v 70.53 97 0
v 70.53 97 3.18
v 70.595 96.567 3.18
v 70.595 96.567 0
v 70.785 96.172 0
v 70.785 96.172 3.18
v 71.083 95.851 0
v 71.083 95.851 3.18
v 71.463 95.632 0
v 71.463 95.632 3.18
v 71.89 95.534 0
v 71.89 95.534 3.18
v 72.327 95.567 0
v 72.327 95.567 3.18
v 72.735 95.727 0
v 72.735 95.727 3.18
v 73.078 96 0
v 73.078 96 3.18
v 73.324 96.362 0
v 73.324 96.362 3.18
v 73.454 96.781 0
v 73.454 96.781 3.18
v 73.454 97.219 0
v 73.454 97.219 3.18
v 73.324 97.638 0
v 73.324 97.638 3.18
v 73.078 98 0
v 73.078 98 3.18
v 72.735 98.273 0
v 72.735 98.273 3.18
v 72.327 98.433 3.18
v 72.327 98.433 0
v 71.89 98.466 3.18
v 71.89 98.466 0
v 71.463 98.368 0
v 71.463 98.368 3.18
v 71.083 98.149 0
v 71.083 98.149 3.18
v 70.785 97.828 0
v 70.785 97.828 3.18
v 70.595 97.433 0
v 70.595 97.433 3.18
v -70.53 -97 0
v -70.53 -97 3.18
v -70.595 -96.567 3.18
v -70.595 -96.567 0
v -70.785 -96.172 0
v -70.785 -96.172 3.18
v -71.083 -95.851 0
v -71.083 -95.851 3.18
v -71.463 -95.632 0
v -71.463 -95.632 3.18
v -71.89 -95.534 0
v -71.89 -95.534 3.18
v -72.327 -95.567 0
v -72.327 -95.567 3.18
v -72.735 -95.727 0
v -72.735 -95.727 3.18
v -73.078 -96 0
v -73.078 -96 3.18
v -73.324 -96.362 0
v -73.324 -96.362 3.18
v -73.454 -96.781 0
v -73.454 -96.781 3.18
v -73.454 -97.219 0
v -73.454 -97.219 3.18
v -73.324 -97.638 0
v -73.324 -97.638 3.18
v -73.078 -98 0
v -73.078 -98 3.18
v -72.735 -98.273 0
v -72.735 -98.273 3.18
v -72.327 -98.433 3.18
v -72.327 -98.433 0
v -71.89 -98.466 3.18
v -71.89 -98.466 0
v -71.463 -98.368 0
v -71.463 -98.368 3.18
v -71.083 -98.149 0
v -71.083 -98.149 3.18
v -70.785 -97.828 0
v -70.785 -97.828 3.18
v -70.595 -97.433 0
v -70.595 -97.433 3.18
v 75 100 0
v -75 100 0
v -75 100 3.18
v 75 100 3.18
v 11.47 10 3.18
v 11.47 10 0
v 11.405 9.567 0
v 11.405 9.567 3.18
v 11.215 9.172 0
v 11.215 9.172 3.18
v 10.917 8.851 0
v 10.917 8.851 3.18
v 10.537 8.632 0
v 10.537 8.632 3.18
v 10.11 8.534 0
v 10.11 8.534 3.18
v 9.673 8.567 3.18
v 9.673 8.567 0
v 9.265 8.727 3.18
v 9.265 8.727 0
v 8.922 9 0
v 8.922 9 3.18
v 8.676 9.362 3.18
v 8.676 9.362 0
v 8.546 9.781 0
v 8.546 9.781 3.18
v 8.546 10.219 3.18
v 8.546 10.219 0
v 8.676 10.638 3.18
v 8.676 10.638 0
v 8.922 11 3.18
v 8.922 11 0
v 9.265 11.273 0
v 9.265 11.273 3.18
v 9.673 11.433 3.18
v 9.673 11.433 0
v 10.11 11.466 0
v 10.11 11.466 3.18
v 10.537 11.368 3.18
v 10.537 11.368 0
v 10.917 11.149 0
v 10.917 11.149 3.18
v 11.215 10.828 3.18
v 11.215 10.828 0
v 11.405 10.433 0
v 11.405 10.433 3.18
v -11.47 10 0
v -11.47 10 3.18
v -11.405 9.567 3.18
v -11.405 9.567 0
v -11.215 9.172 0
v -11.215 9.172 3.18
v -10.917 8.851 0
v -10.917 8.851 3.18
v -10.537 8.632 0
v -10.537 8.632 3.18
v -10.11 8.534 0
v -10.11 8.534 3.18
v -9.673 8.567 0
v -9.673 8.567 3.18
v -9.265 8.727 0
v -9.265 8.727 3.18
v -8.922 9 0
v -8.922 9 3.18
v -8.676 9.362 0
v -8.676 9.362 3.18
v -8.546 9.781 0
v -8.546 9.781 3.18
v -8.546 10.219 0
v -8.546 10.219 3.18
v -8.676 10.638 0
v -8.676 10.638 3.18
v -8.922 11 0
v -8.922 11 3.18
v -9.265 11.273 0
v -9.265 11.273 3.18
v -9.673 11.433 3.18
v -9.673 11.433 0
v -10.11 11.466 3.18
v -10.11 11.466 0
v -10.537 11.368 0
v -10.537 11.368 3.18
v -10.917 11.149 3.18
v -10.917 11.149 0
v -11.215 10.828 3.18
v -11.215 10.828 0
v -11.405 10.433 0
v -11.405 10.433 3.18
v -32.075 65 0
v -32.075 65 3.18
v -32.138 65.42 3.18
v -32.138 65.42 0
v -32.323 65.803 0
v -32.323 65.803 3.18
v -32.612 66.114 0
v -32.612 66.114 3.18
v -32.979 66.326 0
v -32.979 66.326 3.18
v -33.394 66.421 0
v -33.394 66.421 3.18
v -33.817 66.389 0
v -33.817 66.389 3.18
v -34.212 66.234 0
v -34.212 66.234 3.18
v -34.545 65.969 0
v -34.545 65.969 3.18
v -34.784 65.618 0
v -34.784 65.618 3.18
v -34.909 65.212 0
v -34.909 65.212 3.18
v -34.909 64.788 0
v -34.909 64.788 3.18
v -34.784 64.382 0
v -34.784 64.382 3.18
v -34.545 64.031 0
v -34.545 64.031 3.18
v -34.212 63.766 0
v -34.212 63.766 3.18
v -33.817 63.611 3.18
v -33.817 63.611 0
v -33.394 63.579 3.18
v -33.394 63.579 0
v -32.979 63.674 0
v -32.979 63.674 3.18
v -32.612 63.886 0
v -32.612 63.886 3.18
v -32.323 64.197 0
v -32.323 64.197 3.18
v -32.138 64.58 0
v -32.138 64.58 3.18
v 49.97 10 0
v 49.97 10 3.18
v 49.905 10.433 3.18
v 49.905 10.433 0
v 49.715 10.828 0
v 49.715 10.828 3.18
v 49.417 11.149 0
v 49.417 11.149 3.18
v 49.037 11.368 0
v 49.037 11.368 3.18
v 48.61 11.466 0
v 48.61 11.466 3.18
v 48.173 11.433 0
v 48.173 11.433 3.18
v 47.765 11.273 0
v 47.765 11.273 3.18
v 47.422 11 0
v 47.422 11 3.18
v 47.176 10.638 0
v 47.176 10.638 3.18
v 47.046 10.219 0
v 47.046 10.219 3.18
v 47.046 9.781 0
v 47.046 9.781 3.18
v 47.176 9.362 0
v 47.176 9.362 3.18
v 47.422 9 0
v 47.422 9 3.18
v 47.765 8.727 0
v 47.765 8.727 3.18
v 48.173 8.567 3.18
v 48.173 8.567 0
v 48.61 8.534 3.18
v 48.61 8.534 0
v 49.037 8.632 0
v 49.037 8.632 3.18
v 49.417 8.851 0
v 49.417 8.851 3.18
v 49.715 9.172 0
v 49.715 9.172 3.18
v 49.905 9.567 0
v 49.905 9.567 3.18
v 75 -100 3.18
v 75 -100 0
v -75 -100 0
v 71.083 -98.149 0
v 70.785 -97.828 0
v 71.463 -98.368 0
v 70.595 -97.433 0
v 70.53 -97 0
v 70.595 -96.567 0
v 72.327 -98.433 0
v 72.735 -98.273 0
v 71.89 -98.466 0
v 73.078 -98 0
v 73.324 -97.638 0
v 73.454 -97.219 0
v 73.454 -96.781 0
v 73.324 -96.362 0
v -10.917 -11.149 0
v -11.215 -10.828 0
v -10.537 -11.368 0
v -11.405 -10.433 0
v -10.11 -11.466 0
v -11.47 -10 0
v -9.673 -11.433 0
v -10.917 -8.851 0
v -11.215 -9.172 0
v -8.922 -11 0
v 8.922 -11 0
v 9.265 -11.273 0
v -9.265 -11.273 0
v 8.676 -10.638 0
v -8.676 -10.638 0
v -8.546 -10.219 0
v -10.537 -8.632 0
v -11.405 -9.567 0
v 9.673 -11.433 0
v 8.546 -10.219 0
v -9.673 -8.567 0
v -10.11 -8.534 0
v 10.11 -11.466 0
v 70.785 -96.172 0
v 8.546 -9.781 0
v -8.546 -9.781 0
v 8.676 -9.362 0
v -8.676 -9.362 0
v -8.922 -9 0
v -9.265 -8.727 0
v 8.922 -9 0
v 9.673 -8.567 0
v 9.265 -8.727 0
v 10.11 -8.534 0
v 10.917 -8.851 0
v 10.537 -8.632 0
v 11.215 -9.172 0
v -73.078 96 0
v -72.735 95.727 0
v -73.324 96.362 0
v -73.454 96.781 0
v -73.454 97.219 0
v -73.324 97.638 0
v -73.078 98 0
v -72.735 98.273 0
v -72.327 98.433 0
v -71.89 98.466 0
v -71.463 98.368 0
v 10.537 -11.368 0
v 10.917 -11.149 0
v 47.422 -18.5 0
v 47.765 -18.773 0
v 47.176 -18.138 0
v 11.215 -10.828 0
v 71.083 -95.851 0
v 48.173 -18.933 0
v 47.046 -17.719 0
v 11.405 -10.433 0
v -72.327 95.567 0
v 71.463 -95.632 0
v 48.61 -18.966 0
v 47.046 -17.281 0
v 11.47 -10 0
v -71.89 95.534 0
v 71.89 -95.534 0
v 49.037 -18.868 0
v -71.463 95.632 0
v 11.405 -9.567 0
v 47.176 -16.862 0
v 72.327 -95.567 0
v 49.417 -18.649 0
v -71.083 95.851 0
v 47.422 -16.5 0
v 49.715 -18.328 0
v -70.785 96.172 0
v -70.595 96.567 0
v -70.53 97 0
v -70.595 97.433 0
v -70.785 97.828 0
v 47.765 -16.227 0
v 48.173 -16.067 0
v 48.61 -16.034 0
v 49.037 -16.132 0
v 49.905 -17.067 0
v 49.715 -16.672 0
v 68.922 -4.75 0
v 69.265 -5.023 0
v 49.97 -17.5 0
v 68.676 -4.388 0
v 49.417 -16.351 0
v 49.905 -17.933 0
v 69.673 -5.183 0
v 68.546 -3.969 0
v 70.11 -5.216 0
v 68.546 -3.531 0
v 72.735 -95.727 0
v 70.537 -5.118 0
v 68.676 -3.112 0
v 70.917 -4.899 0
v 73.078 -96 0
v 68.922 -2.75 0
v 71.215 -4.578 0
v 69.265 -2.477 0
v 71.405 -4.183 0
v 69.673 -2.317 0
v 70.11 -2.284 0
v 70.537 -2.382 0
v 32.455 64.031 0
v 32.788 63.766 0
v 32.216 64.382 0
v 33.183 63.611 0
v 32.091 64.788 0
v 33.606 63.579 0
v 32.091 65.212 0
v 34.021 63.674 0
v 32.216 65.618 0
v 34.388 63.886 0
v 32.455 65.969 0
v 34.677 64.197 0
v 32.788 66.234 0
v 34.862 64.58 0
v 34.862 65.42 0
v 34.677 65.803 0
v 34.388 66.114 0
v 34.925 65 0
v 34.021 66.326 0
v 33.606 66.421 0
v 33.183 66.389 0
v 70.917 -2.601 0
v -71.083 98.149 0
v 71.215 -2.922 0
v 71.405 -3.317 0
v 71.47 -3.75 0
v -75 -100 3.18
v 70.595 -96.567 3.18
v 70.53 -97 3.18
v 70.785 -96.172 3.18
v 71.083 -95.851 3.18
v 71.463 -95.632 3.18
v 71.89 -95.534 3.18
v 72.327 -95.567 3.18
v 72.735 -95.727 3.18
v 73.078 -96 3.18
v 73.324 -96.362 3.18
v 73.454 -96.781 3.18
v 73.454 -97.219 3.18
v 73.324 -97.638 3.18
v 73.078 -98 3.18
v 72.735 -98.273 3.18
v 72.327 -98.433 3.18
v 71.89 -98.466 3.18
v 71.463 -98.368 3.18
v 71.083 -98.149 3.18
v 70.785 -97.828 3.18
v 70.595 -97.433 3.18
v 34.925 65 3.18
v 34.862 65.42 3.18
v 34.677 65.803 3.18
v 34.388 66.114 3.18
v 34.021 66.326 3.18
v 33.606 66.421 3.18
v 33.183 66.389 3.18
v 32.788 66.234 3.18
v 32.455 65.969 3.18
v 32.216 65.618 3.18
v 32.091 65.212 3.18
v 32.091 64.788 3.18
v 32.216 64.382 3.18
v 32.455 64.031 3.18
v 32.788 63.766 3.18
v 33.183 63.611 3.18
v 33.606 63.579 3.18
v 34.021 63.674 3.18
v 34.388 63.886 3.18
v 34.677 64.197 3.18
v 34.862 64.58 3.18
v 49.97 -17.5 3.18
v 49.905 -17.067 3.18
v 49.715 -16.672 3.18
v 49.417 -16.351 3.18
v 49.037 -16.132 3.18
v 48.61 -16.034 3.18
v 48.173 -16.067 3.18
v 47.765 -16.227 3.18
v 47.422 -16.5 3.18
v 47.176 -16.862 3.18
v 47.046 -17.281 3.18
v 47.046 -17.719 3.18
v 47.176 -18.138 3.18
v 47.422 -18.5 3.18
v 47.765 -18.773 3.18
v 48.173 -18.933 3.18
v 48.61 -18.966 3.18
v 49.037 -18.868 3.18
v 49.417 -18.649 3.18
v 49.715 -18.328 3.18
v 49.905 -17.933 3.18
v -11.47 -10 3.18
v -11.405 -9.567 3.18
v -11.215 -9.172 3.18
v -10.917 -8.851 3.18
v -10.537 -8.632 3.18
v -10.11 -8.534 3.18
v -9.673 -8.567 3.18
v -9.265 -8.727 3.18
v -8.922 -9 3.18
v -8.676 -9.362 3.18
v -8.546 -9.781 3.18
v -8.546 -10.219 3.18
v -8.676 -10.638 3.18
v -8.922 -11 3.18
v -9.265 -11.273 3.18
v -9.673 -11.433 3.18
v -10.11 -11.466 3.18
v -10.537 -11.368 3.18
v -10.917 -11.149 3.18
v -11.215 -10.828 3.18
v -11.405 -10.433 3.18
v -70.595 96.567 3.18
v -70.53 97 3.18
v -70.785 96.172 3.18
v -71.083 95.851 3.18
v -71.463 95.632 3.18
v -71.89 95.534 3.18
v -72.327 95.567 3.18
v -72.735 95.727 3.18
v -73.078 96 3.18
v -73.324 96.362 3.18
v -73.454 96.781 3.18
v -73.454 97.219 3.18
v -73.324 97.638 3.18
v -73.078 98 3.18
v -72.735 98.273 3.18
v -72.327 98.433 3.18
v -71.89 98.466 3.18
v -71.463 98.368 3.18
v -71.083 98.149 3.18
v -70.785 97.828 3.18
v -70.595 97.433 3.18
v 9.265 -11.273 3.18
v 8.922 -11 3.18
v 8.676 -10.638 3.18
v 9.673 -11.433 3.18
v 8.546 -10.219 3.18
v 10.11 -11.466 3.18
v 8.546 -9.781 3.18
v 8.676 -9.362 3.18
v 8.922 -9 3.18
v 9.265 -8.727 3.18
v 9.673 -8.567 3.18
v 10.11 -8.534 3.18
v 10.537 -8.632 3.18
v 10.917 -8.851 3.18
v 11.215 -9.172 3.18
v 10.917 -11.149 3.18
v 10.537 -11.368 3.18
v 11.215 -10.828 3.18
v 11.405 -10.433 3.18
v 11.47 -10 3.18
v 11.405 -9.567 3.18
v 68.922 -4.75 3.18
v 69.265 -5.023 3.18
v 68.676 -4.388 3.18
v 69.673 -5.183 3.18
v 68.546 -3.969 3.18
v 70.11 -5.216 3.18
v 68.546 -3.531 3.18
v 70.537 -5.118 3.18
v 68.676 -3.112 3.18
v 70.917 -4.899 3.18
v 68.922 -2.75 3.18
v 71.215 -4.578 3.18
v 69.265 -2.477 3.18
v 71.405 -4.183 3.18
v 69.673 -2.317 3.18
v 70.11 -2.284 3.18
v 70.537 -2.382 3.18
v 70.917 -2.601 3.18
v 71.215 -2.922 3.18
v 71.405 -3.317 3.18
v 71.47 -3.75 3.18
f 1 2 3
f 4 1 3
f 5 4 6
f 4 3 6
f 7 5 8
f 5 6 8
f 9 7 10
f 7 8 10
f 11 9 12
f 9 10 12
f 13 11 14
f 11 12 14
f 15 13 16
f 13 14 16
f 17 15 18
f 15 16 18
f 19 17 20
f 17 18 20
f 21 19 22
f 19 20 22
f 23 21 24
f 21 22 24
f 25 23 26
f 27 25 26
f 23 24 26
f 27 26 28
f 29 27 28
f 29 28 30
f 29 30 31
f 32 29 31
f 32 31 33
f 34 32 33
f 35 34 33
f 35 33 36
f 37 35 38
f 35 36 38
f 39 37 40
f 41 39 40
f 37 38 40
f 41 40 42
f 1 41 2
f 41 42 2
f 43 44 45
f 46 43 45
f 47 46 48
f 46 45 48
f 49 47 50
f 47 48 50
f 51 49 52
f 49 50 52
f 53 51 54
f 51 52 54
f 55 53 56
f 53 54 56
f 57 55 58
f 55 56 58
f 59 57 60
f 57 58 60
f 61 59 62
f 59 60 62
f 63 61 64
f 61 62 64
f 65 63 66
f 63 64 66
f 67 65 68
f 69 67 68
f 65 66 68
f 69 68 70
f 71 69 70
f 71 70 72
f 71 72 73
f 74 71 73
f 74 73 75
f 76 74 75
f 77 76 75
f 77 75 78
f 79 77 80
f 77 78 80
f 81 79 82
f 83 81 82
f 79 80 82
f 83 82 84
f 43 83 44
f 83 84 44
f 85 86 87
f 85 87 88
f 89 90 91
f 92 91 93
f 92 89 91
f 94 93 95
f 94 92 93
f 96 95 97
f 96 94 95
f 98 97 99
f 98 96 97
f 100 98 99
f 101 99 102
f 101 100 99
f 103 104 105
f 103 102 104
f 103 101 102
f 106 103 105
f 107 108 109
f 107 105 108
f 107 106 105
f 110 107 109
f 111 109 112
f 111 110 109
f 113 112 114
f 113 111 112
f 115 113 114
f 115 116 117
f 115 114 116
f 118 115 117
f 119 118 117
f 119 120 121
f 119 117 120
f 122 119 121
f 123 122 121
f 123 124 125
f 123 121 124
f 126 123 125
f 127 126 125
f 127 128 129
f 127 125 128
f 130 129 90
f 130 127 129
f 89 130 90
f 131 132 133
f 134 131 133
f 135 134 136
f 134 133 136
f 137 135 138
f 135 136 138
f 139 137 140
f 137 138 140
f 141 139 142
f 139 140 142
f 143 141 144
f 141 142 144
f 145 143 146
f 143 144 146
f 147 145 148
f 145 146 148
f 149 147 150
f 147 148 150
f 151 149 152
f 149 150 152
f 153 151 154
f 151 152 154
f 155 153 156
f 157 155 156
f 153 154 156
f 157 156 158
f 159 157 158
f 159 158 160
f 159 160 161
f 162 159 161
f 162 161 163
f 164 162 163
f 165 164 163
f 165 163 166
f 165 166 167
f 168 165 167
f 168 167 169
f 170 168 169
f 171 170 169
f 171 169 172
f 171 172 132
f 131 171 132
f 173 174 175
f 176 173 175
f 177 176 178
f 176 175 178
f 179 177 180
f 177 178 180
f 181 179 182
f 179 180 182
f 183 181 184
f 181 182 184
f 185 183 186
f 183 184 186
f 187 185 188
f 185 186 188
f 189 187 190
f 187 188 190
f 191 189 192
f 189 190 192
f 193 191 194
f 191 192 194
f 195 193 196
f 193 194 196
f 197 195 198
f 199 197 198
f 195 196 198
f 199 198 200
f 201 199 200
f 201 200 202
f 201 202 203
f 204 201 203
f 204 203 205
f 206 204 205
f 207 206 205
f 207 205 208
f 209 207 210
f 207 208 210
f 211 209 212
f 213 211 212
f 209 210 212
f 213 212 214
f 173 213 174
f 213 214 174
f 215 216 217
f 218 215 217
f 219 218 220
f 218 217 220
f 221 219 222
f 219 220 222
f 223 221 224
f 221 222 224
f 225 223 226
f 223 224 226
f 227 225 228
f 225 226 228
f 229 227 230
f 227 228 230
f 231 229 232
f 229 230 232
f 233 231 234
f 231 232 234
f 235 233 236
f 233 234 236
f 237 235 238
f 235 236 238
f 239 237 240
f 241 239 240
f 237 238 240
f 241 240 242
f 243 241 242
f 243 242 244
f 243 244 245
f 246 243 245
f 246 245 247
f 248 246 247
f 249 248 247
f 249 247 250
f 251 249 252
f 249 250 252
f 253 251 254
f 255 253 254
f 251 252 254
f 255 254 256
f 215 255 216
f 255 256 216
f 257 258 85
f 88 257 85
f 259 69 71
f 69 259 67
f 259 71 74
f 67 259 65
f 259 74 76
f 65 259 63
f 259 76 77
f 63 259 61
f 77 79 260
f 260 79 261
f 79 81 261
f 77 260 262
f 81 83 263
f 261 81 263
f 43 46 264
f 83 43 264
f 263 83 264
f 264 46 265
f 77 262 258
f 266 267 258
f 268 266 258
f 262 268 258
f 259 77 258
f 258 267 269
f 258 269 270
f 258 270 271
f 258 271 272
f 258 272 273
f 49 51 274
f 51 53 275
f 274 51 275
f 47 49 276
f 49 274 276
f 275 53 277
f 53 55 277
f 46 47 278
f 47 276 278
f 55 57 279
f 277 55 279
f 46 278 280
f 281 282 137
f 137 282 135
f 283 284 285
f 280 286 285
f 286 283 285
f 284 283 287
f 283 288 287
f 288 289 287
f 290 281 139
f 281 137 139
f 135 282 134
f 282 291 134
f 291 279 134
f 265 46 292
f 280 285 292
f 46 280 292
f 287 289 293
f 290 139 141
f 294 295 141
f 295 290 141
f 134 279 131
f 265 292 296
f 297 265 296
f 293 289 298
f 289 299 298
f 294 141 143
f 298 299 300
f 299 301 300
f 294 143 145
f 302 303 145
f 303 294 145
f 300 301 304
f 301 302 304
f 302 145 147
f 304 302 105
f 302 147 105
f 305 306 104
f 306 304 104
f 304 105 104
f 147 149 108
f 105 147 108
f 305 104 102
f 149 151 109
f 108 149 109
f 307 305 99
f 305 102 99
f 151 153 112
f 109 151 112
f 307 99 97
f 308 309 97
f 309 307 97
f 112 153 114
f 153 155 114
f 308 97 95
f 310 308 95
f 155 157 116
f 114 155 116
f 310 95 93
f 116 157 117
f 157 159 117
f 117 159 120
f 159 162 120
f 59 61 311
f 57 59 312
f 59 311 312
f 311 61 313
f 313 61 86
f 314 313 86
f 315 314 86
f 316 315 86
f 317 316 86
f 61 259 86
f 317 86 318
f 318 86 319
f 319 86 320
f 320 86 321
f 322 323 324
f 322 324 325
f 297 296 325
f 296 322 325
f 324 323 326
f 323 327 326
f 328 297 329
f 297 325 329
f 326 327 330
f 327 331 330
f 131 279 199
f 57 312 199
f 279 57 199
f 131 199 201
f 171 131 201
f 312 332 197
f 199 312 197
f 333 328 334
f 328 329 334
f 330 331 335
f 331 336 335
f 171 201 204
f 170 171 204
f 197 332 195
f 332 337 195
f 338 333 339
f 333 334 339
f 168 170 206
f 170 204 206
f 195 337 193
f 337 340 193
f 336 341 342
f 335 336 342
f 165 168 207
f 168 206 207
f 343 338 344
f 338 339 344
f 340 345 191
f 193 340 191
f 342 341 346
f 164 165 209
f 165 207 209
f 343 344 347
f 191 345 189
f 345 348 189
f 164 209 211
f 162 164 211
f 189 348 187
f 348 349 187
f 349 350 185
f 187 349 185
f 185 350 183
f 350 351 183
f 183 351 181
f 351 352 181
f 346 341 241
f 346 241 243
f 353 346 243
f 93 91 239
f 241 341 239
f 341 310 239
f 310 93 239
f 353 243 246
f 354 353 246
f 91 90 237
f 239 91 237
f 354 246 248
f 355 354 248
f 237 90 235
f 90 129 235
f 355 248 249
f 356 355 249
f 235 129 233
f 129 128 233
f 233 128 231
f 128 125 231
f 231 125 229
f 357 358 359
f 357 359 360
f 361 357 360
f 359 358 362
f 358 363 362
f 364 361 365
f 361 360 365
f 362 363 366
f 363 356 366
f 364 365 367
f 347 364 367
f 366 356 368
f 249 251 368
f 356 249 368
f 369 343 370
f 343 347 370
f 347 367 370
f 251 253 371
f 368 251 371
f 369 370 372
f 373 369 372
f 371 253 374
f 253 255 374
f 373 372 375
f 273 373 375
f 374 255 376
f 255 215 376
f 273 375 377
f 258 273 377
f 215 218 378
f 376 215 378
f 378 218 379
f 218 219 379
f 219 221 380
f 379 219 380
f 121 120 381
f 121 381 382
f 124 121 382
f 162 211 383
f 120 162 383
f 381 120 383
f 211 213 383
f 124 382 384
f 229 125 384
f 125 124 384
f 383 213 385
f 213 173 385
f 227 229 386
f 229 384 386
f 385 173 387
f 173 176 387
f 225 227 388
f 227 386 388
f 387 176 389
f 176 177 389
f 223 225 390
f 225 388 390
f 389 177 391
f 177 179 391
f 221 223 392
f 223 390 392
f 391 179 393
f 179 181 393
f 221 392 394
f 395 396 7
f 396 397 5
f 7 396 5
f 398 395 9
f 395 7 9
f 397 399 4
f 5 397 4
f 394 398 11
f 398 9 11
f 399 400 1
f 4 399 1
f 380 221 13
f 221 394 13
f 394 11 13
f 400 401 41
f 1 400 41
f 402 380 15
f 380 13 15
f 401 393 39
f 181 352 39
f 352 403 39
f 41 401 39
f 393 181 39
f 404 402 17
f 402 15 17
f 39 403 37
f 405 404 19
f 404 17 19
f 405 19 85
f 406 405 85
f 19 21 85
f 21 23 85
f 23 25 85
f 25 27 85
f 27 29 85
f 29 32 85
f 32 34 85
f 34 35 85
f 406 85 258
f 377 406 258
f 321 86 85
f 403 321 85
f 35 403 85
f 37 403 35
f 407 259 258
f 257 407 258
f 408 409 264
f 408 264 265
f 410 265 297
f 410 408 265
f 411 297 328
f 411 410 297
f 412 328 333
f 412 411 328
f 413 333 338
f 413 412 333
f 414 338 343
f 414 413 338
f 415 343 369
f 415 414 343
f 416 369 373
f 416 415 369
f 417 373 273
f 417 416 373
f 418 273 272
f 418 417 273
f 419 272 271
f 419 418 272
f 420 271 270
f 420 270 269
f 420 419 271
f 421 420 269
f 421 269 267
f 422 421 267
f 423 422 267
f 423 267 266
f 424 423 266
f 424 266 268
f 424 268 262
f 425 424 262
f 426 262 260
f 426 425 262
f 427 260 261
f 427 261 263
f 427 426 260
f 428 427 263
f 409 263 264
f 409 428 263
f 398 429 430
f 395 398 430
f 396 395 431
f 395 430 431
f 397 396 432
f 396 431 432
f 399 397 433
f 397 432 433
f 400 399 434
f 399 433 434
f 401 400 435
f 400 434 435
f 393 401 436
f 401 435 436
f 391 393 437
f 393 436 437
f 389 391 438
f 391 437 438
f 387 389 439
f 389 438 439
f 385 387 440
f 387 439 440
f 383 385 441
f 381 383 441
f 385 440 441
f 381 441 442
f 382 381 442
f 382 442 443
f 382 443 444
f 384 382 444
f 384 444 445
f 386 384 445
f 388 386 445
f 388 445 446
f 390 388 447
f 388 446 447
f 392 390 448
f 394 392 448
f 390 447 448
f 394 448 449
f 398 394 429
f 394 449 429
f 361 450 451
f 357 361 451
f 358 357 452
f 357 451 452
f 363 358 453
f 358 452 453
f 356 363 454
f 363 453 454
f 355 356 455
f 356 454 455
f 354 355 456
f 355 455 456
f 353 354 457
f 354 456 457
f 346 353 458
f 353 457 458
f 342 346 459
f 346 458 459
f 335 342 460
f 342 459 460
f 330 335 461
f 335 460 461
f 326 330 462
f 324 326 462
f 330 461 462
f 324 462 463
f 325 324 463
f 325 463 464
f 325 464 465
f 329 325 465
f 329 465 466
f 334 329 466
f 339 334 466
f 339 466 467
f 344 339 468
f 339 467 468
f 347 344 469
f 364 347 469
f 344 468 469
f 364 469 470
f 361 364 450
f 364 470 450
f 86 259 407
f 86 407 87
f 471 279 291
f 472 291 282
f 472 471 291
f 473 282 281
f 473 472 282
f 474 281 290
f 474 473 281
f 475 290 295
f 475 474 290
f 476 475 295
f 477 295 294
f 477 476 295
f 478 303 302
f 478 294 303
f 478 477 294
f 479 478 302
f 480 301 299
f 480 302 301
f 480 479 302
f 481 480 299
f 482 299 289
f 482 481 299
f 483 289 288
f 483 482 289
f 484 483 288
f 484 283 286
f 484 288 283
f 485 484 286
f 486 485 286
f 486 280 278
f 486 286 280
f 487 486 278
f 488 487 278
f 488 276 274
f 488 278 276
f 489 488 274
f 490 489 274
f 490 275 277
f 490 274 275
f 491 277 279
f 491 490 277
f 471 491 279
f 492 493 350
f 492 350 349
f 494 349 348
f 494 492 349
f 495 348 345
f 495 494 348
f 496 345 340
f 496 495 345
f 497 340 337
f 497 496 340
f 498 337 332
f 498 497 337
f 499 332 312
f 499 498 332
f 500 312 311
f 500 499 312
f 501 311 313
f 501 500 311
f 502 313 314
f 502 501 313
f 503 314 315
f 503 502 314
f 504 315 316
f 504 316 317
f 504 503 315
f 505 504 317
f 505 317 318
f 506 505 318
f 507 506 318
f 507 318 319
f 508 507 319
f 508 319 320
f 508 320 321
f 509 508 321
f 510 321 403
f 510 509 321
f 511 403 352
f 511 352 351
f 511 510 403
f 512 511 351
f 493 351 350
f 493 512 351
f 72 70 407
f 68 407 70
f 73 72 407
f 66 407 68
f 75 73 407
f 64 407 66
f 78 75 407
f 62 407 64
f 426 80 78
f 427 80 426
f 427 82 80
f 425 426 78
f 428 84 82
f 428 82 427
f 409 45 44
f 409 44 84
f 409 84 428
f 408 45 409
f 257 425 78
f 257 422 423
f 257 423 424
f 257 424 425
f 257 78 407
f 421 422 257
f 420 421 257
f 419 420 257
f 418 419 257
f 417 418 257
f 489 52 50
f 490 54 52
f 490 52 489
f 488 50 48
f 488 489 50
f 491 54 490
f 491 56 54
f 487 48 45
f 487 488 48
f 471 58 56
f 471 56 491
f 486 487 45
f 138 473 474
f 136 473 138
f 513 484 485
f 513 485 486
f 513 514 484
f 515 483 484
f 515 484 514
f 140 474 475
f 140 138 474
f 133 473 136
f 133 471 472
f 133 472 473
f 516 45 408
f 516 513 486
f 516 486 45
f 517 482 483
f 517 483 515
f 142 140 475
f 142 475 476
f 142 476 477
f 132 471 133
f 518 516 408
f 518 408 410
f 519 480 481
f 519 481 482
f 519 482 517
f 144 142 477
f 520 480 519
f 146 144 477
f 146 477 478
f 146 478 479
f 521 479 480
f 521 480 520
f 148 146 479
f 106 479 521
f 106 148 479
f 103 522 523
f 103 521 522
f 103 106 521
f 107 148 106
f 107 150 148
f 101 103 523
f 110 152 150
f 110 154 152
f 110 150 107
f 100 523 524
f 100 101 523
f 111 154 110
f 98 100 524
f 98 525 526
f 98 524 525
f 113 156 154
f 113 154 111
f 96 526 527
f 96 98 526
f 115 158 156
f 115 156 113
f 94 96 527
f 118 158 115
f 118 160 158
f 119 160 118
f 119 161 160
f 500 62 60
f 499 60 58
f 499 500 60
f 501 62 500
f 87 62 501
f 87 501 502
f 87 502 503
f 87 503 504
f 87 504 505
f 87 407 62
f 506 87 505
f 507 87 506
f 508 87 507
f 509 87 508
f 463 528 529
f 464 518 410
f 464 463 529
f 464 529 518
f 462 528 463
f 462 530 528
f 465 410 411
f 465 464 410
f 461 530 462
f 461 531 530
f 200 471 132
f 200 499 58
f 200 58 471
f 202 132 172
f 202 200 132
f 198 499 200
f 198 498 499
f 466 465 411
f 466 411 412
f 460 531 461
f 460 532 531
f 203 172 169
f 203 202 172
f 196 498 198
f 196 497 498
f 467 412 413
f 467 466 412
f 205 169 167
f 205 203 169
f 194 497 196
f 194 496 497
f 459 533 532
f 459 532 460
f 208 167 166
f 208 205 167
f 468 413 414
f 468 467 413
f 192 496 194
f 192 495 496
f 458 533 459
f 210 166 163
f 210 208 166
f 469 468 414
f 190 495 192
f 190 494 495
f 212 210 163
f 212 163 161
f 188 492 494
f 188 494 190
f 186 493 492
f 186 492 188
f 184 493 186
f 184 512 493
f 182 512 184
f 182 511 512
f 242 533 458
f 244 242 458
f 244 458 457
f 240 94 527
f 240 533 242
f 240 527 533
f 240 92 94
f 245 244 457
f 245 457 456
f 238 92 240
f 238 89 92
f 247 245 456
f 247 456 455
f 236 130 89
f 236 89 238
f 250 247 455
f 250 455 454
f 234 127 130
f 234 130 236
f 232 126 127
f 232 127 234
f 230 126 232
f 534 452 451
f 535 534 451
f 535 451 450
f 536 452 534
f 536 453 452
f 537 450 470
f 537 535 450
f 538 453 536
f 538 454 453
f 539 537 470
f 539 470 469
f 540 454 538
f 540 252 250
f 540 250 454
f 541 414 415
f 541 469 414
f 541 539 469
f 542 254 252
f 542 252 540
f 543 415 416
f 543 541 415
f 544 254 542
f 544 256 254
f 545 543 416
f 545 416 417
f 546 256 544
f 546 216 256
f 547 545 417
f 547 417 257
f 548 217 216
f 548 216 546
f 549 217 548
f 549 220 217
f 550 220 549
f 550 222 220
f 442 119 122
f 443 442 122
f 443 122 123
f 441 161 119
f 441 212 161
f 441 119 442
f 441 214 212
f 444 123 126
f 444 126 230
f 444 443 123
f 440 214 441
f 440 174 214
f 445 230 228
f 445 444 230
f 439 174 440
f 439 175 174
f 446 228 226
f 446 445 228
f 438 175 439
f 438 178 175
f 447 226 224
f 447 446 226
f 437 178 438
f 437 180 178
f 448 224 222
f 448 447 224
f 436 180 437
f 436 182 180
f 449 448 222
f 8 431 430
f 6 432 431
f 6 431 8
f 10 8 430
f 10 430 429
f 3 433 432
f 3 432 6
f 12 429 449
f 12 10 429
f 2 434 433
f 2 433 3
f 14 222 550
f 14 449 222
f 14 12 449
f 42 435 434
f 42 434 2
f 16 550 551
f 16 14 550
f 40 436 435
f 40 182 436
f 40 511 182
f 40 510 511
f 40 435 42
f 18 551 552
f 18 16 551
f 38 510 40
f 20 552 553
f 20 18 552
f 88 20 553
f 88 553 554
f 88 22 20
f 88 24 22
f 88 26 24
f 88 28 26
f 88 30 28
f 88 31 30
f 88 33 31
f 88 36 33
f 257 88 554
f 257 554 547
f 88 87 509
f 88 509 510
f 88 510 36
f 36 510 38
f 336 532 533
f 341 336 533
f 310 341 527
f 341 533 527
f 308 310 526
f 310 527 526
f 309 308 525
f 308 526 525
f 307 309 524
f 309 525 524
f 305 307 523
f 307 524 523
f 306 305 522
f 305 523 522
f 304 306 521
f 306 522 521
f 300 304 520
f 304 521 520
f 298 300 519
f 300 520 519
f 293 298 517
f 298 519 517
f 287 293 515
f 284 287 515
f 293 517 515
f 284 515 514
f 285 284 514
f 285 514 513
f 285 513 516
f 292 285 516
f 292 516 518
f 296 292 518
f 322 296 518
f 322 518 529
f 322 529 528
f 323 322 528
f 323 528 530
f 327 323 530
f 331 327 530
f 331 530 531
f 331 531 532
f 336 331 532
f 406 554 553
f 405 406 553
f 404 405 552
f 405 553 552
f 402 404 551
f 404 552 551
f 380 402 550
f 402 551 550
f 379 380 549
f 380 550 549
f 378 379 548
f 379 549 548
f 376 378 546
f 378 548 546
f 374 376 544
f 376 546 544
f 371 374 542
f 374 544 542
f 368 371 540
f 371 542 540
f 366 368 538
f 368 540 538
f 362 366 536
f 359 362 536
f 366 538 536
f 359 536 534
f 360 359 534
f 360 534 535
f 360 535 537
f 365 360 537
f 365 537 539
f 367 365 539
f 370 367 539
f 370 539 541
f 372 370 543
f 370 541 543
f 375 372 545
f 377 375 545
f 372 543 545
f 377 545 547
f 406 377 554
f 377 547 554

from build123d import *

# Parameters (mm, degrees)
SKETCH1_W               = 150
SKETCH1_H               = 200
BOSS_EXTRUDE1_DEPTH     = 3.18
SKETCH4_R               = 1.47
CUT_EXTRUDE2_DEPTH      = 10
MIRROR4_COPY_1_SKETCH_R = 1.47
MIRROR4_COPY_1_DEPTH    = 10
MIRROR4_COPY_2_SKETCH_R = 1.47
MIRROR4_COPY_2_DEPTH    = 10
SKETCH5_R               = 1.47
CUT_EXTRUDE3_DEPTH      = 3.18
MIRROR6_COPY_1_SKETCH_R = 1.47
MIRROR6_COPY_1_DEPTH    = 3.18
MIRROR6_COPY_2_SKETCH_R = 1.47
MIRROR6_COPY_2_DEPTH    = 3.18
SKETCH6_R               = 1.425
CUT_EXTRUDE5_DEPTH      = 3.18
SKETCH7_R               = 1.47
CUT_EXTRUDE6_DEPTH      = 3.18


with BuildPart() as part:
    # Sketch1 → Boss-Extrude1 (new body)
    with BuildSketch(Plane.XY):
        Rectangle(SKETCH1_W, SKETCH1_H)
    extrude(amount=BOSS_EXTRUDE1_DEPTH)

    # Sketch4 → Cut-Extrude2 (cut)
    with BuildSketch(Plane.XY.offset(3.18)):
        with Locations((10, -10)):
            Circle(SKETCH4_R)
    cut_extrude2 = extrude(amount=-CUT_EXTRUDE2_DEPTH, mode=Mode.SUBTRACT)

    # Mirror3: Cut-Extrude2 across plane
    add(cut_extrude2.mirror(Plane(origin=(0, 0, 0), x_dir=(0, 0, 1), z_dir=(1, 0, 0))), mode=Mode.SUBTRACT)

    # Mirror4 copy 1 sketch → Mirror4 copy 1 (cut)
    with BuildSketch(Plane(origin=(0, 0, 3.18), x_dir=(-1, 0, 0), z_dir=(0, 0, 1))):
        with Locations((10, -10)):
            Circle(MIRROR4_COPY_1_SKETCH_R)
    extrude(amount=-MIRROR4_COPY_1_DEPTH, mode=Mode.SUBTRACT)

    # Mirror4 copy 2 sketch → Mirror4 copy 2 (cut)
    with BuildSketch(Plane.XY.offset(3.18)):
        with Locations((10, 10)):
            Circle(MIRROR4_COPY_2_SKETCH_R)
    extrude(amount=-MIRROR4_COPY_2_DEPTH, mode=Mode.SUBTRACT)

    # Sketch5 → Cut-Extrude3 (cut)
    with BuildSketch(Plane.XY.offset(3.18)):
        with Locations((-72, -97)):
            Circle(SKETCH5_R)
    cut_extrude3 = extrude(amount=-CUT_EXTRUDE3_DEPTH, mode=Mode.SUBTRACT)

    # Mirror5: Cut-Extrude3 across plane
    add(cut_extrude3.mirror(Plane(origin=(0, 0, 0), x_dir=(0, 0, 1), z_dir=(1, 0, 0))), mode=Mode.SUBTRACT)

    # Mirror6 copy 1 sketch → Mirror6 copy 1 (cut)
    with BuildSketch(Plane(origin=(0, 0, 3.18), x_dir=(-1, 0, 0), z_dir=(0, 0, 1))):
        with Locations((-72, -97)):
            Circle(MIRROR6_COPY_1_SKETCH_R)
    extrude(amount=-MIRROR6_COPY_1_DEPTH, mode=Mode.SUBTRACT)

    # Mirror6 copy 2 sketch → Mirror6 copy 2 (cut)
    with BuildSketch(Plane.XY.offset(3.18)):
        with Locations((-72, 97)):
            Circle(MIRROR6_COPY_2_SKETCH_R)
    extrude(amount=-MIRROR6_COPY_2_DEPTH, mode=Mode.SUBTRACT)

    # Sketch6 → Cut-Extrude5 (cut)
    with BuildSketch(Plane.XY.offset(3.18)):
        with Locations((33.5, 65)):
            Circle(SKETCH6_R)
        with Locations((-33.5, 65)):
            Circle(SKETCH6_R)
    extrude(amount=-CUT_EXTRUDE5_DEPTH, mode=Mode.SUBTRACT)

    # Sketch7 → Cut-Extrude6 (cut)
    with BuildSketch(Plane.XY.offset(3.18)):
        with Locations((70, -3.75)):
            Circle(SKETCH7_R)
        with Locations((48.5, 10)):
            Circle(SKETCH7_R)
        with Locations((48.5, -17.5)):
            Circle(SKETCH7_R)
    extrude(amount=-CUT_EXTRUDE6_DEPTH, mode=Mode.SUBTRACT)


solid = part.part
